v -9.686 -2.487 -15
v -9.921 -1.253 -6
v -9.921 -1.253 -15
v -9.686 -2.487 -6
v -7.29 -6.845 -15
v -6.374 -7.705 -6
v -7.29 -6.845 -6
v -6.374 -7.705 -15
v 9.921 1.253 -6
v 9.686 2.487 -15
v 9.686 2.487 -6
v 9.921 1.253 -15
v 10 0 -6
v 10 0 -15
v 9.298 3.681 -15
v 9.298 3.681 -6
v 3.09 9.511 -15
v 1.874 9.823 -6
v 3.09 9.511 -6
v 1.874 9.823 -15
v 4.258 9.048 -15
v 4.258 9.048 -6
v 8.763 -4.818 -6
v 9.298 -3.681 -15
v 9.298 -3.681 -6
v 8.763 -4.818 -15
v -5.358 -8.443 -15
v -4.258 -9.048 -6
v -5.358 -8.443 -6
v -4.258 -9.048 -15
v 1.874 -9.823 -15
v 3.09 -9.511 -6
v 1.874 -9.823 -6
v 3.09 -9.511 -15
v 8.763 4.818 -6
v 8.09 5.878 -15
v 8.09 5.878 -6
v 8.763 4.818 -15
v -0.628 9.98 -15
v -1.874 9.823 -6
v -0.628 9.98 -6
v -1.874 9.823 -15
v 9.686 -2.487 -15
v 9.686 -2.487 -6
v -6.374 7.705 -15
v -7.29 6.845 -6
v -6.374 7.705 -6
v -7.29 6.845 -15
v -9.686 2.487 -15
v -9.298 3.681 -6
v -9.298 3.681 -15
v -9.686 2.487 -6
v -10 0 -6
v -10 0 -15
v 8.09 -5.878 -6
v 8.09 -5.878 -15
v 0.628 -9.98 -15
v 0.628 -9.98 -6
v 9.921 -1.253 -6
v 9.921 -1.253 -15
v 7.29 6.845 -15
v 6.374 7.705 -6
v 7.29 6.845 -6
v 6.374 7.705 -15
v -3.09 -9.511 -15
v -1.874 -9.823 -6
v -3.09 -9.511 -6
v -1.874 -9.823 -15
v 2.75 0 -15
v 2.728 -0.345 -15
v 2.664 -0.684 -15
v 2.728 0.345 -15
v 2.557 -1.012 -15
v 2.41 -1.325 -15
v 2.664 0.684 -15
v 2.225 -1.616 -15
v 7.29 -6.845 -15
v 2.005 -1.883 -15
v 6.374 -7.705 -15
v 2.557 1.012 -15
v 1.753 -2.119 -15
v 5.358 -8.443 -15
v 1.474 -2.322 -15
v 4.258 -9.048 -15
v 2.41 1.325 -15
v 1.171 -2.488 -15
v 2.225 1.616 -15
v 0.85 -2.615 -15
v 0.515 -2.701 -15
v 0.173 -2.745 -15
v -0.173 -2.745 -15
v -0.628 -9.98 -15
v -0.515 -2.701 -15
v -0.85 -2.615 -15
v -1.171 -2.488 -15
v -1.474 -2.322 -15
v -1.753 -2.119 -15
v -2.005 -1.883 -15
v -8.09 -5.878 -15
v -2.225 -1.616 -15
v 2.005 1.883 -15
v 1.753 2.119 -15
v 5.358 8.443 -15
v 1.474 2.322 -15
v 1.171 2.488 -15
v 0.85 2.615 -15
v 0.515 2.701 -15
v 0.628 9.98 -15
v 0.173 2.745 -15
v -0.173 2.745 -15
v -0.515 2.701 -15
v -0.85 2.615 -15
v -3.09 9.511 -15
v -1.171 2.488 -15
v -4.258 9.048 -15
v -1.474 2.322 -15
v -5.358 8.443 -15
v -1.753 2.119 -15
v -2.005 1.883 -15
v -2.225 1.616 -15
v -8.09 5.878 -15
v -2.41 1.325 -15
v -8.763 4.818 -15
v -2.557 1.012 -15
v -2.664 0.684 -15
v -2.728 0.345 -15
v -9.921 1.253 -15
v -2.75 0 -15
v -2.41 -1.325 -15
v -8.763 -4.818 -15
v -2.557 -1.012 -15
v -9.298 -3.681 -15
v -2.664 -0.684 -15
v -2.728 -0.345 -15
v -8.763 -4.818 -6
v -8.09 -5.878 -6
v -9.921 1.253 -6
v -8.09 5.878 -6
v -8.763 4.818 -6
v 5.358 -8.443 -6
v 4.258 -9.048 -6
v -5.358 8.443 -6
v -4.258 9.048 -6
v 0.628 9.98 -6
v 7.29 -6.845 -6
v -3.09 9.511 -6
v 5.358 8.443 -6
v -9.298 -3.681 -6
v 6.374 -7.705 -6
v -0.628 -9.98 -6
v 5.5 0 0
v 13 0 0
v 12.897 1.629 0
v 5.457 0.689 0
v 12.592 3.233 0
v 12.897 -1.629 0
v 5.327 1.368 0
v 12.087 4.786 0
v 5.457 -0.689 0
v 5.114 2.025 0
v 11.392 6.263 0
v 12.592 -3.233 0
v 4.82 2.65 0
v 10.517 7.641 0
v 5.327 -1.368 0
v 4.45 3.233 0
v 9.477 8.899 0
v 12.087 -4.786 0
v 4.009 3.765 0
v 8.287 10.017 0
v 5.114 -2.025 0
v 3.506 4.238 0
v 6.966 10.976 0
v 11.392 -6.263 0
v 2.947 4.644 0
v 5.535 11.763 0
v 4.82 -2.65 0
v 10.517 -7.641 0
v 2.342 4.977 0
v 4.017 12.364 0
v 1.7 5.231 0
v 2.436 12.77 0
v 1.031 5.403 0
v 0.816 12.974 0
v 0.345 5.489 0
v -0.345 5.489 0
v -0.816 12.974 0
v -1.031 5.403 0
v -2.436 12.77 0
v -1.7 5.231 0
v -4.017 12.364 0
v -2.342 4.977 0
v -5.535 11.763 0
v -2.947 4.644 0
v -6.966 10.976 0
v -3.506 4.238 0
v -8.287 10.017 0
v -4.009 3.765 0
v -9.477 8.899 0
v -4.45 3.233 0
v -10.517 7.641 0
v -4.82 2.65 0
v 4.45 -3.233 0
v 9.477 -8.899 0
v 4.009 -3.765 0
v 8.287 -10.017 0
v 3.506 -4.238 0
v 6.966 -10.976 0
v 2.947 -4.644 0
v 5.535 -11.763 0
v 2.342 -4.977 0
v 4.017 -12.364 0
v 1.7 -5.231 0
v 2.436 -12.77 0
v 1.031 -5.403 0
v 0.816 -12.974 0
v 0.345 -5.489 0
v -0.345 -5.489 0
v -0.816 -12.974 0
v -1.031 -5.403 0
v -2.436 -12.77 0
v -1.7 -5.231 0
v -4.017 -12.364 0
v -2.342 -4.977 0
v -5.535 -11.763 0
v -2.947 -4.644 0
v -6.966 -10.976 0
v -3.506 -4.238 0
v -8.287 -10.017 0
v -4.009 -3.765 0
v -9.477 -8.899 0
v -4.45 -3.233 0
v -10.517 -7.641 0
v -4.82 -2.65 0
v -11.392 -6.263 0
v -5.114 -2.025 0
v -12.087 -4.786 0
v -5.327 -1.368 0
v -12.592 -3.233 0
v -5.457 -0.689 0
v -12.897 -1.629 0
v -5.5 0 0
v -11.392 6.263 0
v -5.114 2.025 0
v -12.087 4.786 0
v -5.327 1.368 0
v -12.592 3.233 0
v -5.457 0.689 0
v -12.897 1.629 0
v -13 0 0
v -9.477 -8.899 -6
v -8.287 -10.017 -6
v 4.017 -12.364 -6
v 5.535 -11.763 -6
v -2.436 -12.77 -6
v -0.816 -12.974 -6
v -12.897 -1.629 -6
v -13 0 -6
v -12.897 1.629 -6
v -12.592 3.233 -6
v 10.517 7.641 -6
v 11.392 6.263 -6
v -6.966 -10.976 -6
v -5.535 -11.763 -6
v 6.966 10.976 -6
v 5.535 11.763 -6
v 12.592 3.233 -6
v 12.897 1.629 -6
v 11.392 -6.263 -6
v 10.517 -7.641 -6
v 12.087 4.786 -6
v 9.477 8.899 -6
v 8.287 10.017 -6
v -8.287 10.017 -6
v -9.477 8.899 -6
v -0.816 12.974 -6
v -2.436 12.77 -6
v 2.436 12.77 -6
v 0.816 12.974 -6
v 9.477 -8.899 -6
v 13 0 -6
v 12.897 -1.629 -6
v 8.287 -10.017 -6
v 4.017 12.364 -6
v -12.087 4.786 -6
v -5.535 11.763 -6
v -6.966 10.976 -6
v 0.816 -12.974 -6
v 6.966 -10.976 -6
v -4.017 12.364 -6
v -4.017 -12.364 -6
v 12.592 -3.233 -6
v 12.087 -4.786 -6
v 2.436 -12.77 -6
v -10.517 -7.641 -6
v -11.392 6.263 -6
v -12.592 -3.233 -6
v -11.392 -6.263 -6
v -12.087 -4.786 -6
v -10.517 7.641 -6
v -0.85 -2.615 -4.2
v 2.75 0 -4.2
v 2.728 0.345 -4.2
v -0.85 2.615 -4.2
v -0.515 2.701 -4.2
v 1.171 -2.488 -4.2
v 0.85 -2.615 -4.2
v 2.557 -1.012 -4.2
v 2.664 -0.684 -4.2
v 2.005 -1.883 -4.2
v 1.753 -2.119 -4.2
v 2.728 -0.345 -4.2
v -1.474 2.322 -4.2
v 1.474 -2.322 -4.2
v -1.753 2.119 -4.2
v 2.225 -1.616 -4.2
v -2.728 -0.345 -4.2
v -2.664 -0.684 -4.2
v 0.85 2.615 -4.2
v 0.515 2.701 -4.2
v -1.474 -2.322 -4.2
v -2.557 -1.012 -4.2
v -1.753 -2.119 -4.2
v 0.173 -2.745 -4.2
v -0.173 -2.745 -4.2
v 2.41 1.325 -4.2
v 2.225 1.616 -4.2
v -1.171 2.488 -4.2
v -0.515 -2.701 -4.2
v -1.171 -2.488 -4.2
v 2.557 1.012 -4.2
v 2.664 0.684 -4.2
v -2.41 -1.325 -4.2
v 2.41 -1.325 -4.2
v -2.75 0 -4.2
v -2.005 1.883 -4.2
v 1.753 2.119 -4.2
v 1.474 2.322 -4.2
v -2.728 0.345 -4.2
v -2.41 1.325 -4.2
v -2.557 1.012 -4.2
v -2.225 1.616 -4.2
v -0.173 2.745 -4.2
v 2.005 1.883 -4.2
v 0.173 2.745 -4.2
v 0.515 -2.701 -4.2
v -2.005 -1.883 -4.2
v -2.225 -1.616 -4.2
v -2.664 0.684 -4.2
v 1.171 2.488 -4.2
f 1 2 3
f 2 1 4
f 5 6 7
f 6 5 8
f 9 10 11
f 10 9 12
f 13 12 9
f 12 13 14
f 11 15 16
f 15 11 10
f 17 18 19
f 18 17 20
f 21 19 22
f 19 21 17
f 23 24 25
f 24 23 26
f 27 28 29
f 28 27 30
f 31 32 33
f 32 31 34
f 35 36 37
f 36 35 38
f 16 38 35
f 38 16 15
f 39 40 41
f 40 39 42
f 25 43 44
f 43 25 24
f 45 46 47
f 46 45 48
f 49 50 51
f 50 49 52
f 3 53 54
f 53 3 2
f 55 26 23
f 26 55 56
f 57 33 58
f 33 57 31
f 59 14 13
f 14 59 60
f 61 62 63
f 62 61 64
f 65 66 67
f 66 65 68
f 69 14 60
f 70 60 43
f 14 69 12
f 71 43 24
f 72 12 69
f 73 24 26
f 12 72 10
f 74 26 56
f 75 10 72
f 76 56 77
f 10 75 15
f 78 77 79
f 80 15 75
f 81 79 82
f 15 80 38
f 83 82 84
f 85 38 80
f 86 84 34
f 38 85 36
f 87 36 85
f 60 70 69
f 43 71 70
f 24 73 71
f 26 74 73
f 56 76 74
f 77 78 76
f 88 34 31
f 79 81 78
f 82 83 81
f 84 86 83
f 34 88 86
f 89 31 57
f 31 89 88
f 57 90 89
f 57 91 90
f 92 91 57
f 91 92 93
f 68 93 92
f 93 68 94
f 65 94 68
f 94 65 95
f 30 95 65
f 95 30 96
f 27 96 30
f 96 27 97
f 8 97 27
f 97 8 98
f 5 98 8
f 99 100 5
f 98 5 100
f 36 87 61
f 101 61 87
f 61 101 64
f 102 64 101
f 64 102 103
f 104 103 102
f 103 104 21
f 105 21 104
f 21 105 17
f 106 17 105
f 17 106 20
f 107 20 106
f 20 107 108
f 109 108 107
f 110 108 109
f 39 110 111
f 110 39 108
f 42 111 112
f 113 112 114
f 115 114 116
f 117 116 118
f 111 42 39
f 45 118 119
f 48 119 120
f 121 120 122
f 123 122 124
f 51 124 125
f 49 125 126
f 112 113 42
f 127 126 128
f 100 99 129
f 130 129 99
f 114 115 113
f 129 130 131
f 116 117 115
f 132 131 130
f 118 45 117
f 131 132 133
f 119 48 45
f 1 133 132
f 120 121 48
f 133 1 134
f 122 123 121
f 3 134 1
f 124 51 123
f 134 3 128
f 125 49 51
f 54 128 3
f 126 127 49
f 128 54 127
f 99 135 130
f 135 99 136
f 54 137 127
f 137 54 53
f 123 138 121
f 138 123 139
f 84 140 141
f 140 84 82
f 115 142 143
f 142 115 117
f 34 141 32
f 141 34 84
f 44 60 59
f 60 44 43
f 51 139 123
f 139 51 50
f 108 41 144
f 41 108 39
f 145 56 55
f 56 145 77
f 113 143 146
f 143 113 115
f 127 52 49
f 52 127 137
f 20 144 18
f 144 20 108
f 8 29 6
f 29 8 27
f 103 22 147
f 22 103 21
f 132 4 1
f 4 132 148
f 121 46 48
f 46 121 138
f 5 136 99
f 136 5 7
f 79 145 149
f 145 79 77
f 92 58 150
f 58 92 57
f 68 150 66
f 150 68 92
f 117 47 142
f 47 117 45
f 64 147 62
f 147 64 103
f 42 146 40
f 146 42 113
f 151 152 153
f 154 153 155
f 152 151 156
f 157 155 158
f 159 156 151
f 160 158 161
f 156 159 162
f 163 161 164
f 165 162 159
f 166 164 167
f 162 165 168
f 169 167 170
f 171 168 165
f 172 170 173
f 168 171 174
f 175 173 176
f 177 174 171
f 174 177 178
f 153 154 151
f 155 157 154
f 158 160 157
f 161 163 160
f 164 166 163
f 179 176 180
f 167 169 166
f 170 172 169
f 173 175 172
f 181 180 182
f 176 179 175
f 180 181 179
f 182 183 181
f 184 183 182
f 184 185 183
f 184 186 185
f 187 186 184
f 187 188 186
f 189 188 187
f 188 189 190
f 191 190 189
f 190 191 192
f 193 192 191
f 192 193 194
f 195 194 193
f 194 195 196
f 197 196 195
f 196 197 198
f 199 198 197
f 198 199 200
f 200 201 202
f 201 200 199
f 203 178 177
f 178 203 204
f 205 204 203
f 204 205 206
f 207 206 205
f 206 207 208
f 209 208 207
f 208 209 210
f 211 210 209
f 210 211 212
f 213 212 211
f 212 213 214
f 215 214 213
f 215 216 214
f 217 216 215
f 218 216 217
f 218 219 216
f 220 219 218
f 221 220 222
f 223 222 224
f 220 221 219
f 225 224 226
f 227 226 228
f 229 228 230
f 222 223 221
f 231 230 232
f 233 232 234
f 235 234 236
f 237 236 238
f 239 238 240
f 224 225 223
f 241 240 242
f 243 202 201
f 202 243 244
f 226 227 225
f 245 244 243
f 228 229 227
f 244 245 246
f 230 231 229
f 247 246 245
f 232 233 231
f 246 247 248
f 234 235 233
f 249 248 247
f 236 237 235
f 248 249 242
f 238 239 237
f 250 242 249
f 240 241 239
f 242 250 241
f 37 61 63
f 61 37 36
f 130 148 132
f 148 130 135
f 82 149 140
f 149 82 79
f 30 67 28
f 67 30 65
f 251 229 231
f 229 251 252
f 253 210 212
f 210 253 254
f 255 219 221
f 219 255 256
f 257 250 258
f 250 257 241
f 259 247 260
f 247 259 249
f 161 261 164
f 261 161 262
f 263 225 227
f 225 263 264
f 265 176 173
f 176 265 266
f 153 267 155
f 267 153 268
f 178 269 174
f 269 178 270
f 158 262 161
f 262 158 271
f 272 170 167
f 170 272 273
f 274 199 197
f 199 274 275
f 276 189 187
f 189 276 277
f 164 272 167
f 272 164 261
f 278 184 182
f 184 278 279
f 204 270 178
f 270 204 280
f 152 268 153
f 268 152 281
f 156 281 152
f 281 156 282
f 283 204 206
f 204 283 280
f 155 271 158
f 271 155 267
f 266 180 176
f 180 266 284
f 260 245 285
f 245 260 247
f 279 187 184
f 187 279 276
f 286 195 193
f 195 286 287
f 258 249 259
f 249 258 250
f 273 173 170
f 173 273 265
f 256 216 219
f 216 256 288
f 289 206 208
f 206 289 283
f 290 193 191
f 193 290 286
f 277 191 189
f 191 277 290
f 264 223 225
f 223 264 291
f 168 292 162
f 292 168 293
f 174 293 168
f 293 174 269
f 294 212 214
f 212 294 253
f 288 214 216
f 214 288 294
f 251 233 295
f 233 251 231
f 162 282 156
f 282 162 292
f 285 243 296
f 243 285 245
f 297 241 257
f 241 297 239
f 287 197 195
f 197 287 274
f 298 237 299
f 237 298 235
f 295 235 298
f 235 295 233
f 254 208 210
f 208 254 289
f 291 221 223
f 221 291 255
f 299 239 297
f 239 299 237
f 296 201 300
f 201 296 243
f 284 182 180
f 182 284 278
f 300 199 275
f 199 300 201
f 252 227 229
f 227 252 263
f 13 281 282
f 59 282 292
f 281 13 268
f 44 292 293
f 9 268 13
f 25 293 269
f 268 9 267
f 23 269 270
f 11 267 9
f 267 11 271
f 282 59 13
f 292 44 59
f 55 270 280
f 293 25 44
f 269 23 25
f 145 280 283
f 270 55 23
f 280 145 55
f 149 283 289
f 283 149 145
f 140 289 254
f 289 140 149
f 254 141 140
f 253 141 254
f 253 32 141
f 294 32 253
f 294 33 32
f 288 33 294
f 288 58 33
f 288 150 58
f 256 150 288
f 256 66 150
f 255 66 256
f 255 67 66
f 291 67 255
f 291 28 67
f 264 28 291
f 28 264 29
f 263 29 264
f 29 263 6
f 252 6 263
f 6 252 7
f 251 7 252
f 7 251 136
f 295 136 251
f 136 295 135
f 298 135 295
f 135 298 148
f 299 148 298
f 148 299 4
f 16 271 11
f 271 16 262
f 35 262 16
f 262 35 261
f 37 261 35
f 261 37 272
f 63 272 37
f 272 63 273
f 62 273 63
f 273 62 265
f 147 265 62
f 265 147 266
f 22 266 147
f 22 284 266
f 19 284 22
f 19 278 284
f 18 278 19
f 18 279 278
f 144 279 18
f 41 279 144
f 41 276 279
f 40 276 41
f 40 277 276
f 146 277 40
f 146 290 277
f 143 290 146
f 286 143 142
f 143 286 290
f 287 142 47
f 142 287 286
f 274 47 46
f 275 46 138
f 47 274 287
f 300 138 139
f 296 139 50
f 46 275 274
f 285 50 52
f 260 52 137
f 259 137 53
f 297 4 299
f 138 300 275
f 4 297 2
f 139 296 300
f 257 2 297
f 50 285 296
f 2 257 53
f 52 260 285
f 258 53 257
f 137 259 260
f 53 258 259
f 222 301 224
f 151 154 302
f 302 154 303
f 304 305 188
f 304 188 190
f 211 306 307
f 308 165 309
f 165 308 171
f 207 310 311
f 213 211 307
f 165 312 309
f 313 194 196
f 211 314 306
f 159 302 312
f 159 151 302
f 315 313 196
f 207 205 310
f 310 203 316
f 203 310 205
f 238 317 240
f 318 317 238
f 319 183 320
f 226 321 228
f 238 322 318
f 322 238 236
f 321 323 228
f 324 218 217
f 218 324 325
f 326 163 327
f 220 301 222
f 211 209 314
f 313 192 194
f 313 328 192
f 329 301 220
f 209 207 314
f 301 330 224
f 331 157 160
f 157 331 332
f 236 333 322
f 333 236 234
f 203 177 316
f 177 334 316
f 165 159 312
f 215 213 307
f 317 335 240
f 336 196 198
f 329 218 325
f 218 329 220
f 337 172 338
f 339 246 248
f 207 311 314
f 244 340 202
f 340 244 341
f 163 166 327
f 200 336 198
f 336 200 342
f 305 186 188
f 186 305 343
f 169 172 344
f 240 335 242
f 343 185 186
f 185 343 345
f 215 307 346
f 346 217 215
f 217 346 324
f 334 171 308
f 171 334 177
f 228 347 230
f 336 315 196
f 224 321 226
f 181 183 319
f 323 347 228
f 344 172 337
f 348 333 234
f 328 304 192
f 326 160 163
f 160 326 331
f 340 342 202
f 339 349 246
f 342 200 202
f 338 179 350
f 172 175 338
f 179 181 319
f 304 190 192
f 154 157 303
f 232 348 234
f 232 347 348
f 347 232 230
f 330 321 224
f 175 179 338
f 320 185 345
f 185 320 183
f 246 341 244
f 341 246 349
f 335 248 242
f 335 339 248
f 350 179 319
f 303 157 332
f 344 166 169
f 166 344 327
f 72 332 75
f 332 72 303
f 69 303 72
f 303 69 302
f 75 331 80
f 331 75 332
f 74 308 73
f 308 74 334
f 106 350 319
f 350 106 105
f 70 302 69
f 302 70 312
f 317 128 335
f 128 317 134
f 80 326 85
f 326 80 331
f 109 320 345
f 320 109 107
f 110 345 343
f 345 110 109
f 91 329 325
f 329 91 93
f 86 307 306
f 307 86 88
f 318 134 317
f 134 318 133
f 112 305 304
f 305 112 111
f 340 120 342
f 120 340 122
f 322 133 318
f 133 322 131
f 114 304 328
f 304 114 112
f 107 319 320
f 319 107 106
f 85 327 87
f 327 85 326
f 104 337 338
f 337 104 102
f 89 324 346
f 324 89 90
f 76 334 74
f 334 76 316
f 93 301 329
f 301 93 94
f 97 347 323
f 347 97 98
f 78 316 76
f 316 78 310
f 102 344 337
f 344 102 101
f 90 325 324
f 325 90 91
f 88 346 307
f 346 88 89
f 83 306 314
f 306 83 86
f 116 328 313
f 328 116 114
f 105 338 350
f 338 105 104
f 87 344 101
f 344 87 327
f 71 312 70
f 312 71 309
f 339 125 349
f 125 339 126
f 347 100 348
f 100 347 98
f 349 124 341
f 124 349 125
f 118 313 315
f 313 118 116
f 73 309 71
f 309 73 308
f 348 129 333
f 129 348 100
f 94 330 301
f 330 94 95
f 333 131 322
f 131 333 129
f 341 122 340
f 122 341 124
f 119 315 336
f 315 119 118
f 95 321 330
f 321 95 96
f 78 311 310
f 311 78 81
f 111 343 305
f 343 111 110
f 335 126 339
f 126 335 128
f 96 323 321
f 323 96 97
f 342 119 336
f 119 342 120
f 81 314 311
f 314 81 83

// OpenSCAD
$fn = 50;


difference() {
	union() {
		translate(v = [0, 0, -15.0000000000]) {
			cylinder(h = 15, r = 10.0000000000);
		}
		translate(v = [0, 0, -6.0000000000]) {
			cylinder(h = 6, r = 13.0000000000);
		}
	}
	union() {
		translate(v = [0, 0, 0]) {
			rotate(a = [0, 0, 0]) {
				difference() {
					union() {
						#translate(v = [0, 0, -15.0000000000]) {
							cylinder(h = 15, r = 2.2500000000);
						}
						#translate(v = [0, 0, -4.2000000000]) {
							cylinder(h = 4.2000000000, r = 10.0000000000, r1 = 2.7500000000, r2 = 5.5000000000);
						}
						#translate(v = [0, 0, -15.0000000000]) {
							cylinder(h = 15, r = 2.7500000000);
						}
						#translate(v = [0, 0, -15.0000000000]) {
							cylinder(h = 15, r = 2.2500000000);
						}
					}
					union();
				}
			}
		}
	}
}
